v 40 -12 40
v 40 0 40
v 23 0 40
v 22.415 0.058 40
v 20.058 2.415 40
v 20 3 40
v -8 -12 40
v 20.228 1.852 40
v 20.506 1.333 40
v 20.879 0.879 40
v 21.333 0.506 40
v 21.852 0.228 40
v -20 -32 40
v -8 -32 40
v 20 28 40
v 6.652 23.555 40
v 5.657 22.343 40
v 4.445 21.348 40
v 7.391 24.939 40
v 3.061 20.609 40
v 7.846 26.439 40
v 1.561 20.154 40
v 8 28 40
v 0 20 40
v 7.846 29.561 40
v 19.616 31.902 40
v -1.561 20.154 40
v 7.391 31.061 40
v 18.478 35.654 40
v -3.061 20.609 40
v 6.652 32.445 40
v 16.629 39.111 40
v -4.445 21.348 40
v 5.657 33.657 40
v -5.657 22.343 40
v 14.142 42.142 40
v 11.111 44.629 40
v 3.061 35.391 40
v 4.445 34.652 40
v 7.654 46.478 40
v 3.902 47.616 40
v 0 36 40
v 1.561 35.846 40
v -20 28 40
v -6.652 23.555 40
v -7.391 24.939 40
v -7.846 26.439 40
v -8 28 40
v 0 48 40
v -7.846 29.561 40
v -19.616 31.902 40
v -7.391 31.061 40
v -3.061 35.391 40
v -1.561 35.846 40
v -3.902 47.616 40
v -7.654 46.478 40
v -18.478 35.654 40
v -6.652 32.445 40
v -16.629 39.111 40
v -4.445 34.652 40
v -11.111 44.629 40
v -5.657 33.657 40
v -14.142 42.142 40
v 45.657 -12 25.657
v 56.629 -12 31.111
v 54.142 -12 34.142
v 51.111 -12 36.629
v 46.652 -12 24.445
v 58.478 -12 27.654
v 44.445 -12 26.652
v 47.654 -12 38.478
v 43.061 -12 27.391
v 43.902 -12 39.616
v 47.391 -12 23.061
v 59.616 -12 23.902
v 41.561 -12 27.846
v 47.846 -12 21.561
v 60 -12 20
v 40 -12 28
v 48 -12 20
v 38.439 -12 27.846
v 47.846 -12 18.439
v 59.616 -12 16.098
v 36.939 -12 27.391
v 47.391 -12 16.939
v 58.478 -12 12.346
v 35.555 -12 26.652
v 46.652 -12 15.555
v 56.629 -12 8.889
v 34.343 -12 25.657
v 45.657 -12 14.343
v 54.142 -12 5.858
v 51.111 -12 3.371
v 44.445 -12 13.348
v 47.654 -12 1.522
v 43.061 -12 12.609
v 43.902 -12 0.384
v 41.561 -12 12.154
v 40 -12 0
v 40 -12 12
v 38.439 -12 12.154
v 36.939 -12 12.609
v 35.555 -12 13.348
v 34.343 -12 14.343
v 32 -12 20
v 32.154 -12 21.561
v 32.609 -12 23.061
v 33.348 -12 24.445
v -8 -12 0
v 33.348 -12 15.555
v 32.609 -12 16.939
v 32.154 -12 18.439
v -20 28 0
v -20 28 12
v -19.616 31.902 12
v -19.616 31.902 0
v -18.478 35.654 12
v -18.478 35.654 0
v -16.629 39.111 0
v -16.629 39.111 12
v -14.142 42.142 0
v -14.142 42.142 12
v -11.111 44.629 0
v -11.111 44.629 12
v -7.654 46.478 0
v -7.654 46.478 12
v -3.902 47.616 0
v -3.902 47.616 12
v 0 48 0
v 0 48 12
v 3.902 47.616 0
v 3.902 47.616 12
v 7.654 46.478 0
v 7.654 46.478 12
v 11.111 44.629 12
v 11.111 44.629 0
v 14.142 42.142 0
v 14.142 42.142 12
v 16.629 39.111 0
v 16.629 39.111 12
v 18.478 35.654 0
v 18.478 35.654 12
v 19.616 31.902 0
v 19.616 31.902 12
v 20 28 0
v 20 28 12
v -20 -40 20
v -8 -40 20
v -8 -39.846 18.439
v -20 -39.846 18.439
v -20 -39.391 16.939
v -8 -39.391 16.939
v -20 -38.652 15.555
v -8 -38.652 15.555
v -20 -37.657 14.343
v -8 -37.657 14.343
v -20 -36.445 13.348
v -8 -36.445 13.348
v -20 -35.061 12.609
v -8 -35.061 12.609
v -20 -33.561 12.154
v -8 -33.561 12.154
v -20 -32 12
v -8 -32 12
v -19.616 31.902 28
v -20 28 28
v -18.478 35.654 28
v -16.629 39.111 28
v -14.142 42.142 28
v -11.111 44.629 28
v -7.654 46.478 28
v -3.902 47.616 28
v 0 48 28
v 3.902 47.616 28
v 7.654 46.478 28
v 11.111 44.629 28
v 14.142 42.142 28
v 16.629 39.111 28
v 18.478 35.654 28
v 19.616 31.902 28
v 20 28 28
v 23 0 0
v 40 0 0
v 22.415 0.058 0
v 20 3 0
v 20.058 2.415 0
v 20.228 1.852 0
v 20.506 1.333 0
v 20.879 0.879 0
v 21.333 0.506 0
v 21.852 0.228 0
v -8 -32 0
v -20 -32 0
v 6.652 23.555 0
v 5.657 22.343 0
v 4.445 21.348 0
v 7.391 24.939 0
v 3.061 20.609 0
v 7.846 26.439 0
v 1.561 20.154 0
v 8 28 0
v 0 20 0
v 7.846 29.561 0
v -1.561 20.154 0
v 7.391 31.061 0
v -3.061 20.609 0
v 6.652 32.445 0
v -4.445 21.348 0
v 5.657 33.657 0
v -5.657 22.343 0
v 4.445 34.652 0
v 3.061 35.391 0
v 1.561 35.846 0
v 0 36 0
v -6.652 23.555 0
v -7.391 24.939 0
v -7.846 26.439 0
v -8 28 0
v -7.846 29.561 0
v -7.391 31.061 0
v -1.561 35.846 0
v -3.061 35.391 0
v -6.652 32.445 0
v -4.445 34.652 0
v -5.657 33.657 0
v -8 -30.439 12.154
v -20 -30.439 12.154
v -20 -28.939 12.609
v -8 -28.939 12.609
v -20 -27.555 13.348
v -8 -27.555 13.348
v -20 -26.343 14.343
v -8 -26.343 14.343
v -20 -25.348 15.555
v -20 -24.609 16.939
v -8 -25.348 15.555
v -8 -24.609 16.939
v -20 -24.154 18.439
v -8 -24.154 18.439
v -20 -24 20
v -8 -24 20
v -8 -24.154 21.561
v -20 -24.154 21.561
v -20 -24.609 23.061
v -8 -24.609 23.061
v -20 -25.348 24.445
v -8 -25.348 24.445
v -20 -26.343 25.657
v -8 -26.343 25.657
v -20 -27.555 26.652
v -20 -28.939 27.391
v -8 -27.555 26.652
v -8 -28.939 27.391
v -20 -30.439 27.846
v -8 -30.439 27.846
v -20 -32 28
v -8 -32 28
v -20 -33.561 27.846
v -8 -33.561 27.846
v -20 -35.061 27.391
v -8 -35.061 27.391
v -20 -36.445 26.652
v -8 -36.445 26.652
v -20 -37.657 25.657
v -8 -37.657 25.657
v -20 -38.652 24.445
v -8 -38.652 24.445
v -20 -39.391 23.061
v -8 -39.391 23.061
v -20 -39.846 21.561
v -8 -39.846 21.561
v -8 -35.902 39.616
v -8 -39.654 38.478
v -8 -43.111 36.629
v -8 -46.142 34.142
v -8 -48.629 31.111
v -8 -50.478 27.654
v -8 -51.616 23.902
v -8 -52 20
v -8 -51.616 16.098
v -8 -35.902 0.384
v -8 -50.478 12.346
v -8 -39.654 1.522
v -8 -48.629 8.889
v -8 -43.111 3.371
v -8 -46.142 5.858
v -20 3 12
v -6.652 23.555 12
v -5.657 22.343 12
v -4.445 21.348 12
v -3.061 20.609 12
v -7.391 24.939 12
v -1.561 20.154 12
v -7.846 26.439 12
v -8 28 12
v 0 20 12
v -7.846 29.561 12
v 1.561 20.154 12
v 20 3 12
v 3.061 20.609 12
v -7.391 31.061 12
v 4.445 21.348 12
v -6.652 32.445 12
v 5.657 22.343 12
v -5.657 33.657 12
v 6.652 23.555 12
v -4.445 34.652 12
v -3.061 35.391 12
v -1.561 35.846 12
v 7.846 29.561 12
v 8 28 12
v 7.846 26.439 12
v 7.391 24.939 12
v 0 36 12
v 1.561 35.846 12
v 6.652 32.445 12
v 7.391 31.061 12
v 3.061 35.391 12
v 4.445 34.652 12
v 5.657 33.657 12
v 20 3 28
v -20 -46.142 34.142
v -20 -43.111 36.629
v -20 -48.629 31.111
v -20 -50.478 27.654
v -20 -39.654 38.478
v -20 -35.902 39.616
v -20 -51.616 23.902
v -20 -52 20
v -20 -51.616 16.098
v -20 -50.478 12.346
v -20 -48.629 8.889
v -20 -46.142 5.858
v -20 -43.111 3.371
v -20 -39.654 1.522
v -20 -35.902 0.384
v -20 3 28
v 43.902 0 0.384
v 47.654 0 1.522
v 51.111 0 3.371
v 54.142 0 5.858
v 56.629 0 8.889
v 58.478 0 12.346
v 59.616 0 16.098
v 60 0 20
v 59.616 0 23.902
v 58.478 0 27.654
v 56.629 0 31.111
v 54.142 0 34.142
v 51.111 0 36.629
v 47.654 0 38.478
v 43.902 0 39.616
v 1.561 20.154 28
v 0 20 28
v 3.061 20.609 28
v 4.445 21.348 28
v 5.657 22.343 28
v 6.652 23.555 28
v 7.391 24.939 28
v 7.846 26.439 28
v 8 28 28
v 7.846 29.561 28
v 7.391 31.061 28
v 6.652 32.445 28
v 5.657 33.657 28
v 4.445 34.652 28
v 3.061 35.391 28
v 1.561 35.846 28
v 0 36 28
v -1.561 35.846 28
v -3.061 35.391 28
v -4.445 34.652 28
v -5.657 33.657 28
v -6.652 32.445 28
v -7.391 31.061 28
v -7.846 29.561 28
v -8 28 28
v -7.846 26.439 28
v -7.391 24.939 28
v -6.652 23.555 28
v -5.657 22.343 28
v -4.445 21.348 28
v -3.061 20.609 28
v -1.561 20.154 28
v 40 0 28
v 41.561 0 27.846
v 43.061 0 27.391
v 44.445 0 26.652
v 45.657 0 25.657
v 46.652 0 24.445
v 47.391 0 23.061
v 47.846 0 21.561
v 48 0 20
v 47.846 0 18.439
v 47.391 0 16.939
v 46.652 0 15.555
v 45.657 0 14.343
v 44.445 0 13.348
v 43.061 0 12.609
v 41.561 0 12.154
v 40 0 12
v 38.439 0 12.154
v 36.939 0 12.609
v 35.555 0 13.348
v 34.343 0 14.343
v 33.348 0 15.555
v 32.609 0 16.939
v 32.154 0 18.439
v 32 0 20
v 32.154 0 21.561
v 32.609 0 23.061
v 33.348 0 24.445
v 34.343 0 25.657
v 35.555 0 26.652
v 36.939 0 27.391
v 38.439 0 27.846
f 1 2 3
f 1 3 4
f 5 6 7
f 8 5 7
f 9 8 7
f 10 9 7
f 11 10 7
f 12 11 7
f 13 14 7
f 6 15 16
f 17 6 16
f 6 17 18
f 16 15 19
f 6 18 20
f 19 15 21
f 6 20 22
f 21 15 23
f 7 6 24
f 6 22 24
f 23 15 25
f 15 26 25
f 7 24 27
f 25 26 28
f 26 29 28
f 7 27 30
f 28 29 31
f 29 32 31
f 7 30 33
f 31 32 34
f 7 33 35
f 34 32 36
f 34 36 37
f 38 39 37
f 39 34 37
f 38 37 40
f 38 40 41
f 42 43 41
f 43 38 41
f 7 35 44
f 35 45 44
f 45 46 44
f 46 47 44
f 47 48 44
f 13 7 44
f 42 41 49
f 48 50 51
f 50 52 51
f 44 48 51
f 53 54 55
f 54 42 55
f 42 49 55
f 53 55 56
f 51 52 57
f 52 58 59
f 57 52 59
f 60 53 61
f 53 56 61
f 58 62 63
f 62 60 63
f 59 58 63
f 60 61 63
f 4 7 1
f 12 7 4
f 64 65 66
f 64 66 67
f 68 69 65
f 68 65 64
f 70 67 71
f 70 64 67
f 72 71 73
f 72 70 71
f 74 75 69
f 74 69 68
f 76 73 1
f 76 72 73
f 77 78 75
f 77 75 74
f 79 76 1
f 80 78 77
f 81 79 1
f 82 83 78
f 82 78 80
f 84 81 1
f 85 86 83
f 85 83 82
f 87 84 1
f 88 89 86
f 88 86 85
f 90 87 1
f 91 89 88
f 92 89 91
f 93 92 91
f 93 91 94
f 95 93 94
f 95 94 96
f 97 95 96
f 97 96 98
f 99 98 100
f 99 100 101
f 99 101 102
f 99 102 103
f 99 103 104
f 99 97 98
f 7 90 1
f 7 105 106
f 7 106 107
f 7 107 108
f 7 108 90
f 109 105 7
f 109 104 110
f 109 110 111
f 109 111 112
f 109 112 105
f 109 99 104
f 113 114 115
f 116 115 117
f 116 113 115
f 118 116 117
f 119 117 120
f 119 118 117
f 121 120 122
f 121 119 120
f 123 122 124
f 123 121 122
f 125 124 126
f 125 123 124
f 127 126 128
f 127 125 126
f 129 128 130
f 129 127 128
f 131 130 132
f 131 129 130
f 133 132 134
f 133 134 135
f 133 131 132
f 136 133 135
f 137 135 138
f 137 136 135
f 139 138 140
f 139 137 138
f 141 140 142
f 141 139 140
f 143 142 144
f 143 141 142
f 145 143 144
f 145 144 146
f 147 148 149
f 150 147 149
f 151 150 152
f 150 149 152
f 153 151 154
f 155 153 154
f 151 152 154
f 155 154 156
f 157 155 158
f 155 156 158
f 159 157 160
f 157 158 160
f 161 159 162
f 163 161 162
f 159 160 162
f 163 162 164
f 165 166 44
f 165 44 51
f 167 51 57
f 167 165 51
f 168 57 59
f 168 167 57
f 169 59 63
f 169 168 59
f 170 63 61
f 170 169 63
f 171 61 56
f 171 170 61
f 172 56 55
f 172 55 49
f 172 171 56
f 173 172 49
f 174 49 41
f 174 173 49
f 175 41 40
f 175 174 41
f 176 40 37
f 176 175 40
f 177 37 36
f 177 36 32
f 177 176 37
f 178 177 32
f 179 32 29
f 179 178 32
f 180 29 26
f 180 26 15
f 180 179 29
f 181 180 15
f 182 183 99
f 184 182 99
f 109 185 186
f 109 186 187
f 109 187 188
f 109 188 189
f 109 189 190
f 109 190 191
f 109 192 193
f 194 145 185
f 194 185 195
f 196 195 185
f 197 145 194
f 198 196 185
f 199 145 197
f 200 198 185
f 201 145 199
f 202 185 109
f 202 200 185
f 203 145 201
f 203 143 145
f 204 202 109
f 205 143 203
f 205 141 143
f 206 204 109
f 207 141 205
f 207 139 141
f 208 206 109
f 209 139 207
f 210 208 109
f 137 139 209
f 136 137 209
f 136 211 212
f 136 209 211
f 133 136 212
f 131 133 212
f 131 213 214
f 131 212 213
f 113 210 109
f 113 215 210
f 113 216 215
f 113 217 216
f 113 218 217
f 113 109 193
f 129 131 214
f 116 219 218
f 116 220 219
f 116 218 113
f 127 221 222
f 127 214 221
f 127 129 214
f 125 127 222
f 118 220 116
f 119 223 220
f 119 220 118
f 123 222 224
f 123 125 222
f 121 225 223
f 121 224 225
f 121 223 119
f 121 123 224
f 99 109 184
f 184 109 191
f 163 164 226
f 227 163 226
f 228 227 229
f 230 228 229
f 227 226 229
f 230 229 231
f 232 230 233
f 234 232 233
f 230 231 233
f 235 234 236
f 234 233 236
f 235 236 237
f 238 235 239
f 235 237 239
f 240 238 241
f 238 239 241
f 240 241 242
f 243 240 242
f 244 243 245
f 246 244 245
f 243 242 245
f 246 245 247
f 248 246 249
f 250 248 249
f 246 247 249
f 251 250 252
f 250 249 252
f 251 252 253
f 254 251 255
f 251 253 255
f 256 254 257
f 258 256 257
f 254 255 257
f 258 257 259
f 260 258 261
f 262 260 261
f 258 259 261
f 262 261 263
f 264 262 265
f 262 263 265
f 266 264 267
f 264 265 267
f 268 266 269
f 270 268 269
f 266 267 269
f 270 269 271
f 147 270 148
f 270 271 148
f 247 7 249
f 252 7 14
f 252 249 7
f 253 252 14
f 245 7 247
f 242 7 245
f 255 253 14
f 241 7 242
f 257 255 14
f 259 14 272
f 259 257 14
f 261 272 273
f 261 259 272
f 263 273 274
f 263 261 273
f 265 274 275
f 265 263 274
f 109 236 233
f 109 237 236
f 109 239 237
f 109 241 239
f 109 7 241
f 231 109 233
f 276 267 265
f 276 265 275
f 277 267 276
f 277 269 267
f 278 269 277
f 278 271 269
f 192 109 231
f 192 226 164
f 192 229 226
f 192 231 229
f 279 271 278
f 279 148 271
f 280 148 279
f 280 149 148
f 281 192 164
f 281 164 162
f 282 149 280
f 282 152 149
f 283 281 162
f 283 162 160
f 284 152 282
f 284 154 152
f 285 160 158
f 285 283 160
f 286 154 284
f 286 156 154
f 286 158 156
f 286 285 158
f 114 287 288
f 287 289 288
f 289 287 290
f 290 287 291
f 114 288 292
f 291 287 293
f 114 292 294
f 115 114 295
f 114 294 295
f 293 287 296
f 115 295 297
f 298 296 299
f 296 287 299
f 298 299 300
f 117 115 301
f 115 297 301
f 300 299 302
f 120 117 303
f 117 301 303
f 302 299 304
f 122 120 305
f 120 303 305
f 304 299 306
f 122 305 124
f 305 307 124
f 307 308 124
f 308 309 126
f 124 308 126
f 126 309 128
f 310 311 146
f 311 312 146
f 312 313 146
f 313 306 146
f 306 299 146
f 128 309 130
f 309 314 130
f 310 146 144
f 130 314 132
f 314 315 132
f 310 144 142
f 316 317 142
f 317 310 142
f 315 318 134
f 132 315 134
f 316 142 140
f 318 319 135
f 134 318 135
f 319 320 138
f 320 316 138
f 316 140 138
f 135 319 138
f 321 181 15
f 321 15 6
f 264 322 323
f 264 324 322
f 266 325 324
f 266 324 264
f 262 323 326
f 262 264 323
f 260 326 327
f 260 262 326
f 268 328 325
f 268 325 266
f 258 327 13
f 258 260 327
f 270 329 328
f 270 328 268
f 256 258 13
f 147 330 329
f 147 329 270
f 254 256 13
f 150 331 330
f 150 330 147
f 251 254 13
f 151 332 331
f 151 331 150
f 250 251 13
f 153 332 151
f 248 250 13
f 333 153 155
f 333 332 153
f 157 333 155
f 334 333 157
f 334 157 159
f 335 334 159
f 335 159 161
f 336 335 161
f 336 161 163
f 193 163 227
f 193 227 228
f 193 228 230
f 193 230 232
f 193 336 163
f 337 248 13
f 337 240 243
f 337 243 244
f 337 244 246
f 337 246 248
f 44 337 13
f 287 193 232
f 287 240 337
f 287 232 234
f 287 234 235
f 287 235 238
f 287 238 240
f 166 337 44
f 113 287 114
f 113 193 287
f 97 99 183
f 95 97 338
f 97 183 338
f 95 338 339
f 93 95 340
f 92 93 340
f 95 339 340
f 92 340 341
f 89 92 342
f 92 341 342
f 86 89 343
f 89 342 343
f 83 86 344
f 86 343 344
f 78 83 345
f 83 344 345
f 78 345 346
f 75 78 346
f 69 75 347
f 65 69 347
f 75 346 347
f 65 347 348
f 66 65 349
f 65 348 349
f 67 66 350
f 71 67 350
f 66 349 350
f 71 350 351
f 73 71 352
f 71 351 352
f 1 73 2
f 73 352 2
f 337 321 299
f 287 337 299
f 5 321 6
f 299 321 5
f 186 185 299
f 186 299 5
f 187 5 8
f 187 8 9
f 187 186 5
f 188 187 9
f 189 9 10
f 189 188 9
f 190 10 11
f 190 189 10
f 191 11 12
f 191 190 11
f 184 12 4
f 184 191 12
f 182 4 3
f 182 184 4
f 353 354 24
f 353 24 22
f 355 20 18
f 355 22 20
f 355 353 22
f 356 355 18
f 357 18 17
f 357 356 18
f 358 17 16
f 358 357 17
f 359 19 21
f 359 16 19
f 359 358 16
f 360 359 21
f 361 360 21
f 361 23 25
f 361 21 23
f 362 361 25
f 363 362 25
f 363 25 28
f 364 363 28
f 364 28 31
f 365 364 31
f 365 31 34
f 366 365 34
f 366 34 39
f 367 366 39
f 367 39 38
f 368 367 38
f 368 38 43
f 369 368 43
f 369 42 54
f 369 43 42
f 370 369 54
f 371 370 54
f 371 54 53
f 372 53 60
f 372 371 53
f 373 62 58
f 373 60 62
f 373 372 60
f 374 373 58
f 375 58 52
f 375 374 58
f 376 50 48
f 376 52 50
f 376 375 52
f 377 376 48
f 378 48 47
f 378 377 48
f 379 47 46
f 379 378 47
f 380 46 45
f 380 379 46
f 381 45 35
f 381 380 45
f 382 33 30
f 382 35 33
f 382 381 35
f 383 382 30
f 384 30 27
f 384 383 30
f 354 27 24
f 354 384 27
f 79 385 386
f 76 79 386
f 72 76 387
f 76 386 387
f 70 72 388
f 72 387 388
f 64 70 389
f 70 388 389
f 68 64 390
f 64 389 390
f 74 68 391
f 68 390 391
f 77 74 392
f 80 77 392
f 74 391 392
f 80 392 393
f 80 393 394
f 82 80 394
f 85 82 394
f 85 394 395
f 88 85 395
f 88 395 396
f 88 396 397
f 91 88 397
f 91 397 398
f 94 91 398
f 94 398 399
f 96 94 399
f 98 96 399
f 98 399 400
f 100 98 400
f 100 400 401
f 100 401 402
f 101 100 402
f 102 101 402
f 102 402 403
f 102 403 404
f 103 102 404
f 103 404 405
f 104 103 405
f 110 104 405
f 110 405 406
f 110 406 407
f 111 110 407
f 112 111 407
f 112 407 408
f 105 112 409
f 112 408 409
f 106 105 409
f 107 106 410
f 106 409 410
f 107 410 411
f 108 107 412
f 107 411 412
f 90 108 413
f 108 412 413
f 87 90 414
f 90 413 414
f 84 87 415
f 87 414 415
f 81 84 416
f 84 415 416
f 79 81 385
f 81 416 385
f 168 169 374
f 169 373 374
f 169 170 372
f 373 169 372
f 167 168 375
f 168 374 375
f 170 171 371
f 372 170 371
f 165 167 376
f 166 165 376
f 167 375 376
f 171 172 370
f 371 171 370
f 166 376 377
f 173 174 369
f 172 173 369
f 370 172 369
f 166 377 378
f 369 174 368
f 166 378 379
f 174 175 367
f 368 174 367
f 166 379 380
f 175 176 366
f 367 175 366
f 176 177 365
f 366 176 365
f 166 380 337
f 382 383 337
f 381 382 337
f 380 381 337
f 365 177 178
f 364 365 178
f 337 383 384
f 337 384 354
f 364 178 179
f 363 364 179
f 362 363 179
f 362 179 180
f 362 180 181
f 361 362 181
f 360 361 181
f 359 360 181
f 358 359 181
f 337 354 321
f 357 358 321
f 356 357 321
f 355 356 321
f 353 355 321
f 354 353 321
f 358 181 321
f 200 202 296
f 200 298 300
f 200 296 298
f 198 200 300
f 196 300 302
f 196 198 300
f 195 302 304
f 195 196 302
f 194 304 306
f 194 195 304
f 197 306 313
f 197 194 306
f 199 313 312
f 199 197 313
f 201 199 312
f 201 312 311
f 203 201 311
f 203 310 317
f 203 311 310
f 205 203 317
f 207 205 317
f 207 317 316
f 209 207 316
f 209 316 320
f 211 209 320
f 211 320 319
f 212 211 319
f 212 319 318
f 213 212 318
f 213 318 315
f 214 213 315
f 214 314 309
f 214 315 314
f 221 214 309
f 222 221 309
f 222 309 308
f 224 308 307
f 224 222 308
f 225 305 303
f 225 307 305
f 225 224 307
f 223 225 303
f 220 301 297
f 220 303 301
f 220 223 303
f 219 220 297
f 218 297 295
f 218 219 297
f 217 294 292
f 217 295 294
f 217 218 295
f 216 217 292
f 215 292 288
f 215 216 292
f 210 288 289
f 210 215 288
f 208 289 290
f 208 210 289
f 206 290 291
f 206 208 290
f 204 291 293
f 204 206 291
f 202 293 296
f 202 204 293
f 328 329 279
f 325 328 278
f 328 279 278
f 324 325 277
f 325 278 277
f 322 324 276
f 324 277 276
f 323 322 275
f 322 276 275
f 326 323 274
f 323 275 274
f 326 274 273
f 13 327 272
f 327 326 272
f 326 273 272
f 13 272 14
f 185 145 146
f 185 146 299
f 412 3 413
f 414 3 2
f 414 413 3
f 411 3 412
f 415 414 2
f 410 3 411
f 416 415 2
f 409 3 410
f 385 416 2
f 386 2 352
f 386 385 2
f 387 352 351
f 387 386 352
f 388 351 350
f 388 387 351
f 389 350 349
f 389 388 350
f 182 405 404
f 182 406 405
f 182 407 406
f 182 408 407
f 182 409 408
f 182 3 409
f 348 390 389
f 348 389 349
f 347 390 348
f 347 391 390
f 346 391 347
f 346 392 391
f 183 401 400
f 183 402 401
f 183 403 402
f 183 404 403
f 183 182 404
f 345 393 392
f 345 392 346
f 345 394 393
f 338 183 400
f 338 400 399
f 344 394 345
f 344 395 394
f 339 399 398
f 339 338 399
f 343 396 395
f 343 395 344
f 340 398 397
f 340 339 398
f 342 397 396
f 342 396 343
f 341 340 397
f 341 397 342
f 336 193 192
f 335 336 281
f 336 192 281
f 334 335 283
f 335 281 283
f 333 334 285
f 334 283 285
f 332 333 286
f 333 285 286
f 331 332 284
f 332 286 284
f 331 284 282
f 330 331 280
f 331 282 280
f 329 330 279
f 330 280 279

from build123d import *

# Parameters (mm, degrees)
BOSS_EXTRUDE3_DEPTH     = 40
CUT_EXTRUDE4_DEPTH      = 12
CUT_EXTRUDE5_DEPTH      = 22.5
CUT_EXTRUDE7_DEPTH      = 45
SKETCH13_R              = 8
CUT_EXTRUDE8_DEPTH      = 45
CUT_EXTRUDE9_DEPTH      = 54
CUT_EXTRUDE9_DEPTH_BACK = 41
SKETCH14_R              = 8


with BuildPart() as part:
    # Sketch1 → Boss-Extrude3 (new body)
    with BuildSketch(Plane.XY):
        with BuildLine():
            Line((23, 0), (60, 0))
            Line((60, 0), (60, -12))
            Line((60, -12), (-8, -12))
            Line((-8, -12), (-8, -52))
            Line((-8, -52), (-20, -52))
            Line((-20, -52), (-20, 28))
            ThreePointArc((-20, 28), (0, 48), (20, 28))
            Line((20, 28), (20, 3))
            ThreePointArc((20, 3), (20.878679656, 0.878679656), (23, 0))
        make_face()
    extrude(amount=BOSS_EXTRUDE3_DEPTH)

    # Sketch10 → Cut-Extrude4 (cut)
    with BuildSketch(Plane(origin=(0, 0, 0), x_dir=(1, 0, 0), z_dir=(0, 1, 0))):
        with BuildLine():
            Line((60, -40), (60, -20))
            ThreePointArc((60, -20), (54.142135624, -34.142135624), (40, -40))
            Line((40, -40), (60, -40))
        make_face()
        with BuildLine():
            Line((60, -20), (60, 0))
            Line((60, 0), (40, 0))
            ThreePointArc((40, 0), (54.142135624, -5.857864376), (60, -20))
        make_face()
    extrude(amount=-CUT_EXTRUDE4_DEPTH, mode=Mode.SUBTRACT)

    # Sketch11 → Cut-Extrude5 (cut, symmetric)
    with BuildSketch(Plane(origin=(0, 0, 0), x_dir=(0, 0, -1), z_dir=(1, 0, 0))):
        Polygon((-20, 48), (-28, 48), (-28, 3), (-12, 3), (-12, 48), align=None)
    extrude(amount=CUT_EXTRUDE5_DEPTH, both=True, mode=Mode.SUBTRACT)

    # Sketch12 → Cut-Extrude7 (cut)
    with BuildSketch(Plane(origin=(-8, 0, 0), x_dir=(0, 0, -1), z_dir=(1, 0, 0))):
        with BuildLine():
            ThreePointArc((-20, -24), (-28, -32), (-20, -40))
            Line((-20, -40), (-20, -24))
        make_face()
        with BuildLine():
            Line((-20, -24), (-20, -40))
            ThreePointArc((-20, -40), (-14.343145751, -37.656854249), (-12, -32))
            ThreePointArc((-12, -32), (-14.343145751, -26.343145751), (-20, -24))
        make_face()
        with BuildLine():
            Line((-40, -52), (-20, -52))
            ThreePointArc((-20, -52), (-34.142135624, -46.142135624), (-40, -32))
            Line((-40, -32), (-40, -52))
        make_face()
        with BuildLine():
            ThreePointArc((0, -32), (-5.857864376, -46.142135624), (-20, -52))
            Line((-20, -52), (0, -52))
            Line((0, -52), (0, -32))
        make_face()
    extrude(amount=-CUT_EXTRUDE7_DEPTH, mode=Mode.SUBTRACT)

    # Sketch13 → Cut-Extrude8 (cut)
    with BuildSketch(Plane(origin=(0, 0, 0), x_dir=(1, 0, 0), z_dir=(0, 1, 0))):
        with Locations(Location((40, -20, 0), (0, 0, 270))):
            Circle(SKETCH13_R)
    extrude(amount=-CUT_EXTRUDE8_DEPTH, mode=Mode.SUBTRACT)

    # Sketch14 → Cut-Extrude9 (cut, two sides: drawn at the far end of the back side and taken through both)
    with BuildSketch(Plane.XY.offset(-CUT_EXTRUDE9_DEPTH_BACK)):
        with Locations(Location((0, 28, 0), (0, 0, 270))):
            Circle(SKETCH14_R)
    extrude(amount=CUT_EXTRUDE9_DEPTH + CUT_EXTRUDE9_DEPTH_BACK, mode=Mode.SUBTRACT)


solid = part.part
